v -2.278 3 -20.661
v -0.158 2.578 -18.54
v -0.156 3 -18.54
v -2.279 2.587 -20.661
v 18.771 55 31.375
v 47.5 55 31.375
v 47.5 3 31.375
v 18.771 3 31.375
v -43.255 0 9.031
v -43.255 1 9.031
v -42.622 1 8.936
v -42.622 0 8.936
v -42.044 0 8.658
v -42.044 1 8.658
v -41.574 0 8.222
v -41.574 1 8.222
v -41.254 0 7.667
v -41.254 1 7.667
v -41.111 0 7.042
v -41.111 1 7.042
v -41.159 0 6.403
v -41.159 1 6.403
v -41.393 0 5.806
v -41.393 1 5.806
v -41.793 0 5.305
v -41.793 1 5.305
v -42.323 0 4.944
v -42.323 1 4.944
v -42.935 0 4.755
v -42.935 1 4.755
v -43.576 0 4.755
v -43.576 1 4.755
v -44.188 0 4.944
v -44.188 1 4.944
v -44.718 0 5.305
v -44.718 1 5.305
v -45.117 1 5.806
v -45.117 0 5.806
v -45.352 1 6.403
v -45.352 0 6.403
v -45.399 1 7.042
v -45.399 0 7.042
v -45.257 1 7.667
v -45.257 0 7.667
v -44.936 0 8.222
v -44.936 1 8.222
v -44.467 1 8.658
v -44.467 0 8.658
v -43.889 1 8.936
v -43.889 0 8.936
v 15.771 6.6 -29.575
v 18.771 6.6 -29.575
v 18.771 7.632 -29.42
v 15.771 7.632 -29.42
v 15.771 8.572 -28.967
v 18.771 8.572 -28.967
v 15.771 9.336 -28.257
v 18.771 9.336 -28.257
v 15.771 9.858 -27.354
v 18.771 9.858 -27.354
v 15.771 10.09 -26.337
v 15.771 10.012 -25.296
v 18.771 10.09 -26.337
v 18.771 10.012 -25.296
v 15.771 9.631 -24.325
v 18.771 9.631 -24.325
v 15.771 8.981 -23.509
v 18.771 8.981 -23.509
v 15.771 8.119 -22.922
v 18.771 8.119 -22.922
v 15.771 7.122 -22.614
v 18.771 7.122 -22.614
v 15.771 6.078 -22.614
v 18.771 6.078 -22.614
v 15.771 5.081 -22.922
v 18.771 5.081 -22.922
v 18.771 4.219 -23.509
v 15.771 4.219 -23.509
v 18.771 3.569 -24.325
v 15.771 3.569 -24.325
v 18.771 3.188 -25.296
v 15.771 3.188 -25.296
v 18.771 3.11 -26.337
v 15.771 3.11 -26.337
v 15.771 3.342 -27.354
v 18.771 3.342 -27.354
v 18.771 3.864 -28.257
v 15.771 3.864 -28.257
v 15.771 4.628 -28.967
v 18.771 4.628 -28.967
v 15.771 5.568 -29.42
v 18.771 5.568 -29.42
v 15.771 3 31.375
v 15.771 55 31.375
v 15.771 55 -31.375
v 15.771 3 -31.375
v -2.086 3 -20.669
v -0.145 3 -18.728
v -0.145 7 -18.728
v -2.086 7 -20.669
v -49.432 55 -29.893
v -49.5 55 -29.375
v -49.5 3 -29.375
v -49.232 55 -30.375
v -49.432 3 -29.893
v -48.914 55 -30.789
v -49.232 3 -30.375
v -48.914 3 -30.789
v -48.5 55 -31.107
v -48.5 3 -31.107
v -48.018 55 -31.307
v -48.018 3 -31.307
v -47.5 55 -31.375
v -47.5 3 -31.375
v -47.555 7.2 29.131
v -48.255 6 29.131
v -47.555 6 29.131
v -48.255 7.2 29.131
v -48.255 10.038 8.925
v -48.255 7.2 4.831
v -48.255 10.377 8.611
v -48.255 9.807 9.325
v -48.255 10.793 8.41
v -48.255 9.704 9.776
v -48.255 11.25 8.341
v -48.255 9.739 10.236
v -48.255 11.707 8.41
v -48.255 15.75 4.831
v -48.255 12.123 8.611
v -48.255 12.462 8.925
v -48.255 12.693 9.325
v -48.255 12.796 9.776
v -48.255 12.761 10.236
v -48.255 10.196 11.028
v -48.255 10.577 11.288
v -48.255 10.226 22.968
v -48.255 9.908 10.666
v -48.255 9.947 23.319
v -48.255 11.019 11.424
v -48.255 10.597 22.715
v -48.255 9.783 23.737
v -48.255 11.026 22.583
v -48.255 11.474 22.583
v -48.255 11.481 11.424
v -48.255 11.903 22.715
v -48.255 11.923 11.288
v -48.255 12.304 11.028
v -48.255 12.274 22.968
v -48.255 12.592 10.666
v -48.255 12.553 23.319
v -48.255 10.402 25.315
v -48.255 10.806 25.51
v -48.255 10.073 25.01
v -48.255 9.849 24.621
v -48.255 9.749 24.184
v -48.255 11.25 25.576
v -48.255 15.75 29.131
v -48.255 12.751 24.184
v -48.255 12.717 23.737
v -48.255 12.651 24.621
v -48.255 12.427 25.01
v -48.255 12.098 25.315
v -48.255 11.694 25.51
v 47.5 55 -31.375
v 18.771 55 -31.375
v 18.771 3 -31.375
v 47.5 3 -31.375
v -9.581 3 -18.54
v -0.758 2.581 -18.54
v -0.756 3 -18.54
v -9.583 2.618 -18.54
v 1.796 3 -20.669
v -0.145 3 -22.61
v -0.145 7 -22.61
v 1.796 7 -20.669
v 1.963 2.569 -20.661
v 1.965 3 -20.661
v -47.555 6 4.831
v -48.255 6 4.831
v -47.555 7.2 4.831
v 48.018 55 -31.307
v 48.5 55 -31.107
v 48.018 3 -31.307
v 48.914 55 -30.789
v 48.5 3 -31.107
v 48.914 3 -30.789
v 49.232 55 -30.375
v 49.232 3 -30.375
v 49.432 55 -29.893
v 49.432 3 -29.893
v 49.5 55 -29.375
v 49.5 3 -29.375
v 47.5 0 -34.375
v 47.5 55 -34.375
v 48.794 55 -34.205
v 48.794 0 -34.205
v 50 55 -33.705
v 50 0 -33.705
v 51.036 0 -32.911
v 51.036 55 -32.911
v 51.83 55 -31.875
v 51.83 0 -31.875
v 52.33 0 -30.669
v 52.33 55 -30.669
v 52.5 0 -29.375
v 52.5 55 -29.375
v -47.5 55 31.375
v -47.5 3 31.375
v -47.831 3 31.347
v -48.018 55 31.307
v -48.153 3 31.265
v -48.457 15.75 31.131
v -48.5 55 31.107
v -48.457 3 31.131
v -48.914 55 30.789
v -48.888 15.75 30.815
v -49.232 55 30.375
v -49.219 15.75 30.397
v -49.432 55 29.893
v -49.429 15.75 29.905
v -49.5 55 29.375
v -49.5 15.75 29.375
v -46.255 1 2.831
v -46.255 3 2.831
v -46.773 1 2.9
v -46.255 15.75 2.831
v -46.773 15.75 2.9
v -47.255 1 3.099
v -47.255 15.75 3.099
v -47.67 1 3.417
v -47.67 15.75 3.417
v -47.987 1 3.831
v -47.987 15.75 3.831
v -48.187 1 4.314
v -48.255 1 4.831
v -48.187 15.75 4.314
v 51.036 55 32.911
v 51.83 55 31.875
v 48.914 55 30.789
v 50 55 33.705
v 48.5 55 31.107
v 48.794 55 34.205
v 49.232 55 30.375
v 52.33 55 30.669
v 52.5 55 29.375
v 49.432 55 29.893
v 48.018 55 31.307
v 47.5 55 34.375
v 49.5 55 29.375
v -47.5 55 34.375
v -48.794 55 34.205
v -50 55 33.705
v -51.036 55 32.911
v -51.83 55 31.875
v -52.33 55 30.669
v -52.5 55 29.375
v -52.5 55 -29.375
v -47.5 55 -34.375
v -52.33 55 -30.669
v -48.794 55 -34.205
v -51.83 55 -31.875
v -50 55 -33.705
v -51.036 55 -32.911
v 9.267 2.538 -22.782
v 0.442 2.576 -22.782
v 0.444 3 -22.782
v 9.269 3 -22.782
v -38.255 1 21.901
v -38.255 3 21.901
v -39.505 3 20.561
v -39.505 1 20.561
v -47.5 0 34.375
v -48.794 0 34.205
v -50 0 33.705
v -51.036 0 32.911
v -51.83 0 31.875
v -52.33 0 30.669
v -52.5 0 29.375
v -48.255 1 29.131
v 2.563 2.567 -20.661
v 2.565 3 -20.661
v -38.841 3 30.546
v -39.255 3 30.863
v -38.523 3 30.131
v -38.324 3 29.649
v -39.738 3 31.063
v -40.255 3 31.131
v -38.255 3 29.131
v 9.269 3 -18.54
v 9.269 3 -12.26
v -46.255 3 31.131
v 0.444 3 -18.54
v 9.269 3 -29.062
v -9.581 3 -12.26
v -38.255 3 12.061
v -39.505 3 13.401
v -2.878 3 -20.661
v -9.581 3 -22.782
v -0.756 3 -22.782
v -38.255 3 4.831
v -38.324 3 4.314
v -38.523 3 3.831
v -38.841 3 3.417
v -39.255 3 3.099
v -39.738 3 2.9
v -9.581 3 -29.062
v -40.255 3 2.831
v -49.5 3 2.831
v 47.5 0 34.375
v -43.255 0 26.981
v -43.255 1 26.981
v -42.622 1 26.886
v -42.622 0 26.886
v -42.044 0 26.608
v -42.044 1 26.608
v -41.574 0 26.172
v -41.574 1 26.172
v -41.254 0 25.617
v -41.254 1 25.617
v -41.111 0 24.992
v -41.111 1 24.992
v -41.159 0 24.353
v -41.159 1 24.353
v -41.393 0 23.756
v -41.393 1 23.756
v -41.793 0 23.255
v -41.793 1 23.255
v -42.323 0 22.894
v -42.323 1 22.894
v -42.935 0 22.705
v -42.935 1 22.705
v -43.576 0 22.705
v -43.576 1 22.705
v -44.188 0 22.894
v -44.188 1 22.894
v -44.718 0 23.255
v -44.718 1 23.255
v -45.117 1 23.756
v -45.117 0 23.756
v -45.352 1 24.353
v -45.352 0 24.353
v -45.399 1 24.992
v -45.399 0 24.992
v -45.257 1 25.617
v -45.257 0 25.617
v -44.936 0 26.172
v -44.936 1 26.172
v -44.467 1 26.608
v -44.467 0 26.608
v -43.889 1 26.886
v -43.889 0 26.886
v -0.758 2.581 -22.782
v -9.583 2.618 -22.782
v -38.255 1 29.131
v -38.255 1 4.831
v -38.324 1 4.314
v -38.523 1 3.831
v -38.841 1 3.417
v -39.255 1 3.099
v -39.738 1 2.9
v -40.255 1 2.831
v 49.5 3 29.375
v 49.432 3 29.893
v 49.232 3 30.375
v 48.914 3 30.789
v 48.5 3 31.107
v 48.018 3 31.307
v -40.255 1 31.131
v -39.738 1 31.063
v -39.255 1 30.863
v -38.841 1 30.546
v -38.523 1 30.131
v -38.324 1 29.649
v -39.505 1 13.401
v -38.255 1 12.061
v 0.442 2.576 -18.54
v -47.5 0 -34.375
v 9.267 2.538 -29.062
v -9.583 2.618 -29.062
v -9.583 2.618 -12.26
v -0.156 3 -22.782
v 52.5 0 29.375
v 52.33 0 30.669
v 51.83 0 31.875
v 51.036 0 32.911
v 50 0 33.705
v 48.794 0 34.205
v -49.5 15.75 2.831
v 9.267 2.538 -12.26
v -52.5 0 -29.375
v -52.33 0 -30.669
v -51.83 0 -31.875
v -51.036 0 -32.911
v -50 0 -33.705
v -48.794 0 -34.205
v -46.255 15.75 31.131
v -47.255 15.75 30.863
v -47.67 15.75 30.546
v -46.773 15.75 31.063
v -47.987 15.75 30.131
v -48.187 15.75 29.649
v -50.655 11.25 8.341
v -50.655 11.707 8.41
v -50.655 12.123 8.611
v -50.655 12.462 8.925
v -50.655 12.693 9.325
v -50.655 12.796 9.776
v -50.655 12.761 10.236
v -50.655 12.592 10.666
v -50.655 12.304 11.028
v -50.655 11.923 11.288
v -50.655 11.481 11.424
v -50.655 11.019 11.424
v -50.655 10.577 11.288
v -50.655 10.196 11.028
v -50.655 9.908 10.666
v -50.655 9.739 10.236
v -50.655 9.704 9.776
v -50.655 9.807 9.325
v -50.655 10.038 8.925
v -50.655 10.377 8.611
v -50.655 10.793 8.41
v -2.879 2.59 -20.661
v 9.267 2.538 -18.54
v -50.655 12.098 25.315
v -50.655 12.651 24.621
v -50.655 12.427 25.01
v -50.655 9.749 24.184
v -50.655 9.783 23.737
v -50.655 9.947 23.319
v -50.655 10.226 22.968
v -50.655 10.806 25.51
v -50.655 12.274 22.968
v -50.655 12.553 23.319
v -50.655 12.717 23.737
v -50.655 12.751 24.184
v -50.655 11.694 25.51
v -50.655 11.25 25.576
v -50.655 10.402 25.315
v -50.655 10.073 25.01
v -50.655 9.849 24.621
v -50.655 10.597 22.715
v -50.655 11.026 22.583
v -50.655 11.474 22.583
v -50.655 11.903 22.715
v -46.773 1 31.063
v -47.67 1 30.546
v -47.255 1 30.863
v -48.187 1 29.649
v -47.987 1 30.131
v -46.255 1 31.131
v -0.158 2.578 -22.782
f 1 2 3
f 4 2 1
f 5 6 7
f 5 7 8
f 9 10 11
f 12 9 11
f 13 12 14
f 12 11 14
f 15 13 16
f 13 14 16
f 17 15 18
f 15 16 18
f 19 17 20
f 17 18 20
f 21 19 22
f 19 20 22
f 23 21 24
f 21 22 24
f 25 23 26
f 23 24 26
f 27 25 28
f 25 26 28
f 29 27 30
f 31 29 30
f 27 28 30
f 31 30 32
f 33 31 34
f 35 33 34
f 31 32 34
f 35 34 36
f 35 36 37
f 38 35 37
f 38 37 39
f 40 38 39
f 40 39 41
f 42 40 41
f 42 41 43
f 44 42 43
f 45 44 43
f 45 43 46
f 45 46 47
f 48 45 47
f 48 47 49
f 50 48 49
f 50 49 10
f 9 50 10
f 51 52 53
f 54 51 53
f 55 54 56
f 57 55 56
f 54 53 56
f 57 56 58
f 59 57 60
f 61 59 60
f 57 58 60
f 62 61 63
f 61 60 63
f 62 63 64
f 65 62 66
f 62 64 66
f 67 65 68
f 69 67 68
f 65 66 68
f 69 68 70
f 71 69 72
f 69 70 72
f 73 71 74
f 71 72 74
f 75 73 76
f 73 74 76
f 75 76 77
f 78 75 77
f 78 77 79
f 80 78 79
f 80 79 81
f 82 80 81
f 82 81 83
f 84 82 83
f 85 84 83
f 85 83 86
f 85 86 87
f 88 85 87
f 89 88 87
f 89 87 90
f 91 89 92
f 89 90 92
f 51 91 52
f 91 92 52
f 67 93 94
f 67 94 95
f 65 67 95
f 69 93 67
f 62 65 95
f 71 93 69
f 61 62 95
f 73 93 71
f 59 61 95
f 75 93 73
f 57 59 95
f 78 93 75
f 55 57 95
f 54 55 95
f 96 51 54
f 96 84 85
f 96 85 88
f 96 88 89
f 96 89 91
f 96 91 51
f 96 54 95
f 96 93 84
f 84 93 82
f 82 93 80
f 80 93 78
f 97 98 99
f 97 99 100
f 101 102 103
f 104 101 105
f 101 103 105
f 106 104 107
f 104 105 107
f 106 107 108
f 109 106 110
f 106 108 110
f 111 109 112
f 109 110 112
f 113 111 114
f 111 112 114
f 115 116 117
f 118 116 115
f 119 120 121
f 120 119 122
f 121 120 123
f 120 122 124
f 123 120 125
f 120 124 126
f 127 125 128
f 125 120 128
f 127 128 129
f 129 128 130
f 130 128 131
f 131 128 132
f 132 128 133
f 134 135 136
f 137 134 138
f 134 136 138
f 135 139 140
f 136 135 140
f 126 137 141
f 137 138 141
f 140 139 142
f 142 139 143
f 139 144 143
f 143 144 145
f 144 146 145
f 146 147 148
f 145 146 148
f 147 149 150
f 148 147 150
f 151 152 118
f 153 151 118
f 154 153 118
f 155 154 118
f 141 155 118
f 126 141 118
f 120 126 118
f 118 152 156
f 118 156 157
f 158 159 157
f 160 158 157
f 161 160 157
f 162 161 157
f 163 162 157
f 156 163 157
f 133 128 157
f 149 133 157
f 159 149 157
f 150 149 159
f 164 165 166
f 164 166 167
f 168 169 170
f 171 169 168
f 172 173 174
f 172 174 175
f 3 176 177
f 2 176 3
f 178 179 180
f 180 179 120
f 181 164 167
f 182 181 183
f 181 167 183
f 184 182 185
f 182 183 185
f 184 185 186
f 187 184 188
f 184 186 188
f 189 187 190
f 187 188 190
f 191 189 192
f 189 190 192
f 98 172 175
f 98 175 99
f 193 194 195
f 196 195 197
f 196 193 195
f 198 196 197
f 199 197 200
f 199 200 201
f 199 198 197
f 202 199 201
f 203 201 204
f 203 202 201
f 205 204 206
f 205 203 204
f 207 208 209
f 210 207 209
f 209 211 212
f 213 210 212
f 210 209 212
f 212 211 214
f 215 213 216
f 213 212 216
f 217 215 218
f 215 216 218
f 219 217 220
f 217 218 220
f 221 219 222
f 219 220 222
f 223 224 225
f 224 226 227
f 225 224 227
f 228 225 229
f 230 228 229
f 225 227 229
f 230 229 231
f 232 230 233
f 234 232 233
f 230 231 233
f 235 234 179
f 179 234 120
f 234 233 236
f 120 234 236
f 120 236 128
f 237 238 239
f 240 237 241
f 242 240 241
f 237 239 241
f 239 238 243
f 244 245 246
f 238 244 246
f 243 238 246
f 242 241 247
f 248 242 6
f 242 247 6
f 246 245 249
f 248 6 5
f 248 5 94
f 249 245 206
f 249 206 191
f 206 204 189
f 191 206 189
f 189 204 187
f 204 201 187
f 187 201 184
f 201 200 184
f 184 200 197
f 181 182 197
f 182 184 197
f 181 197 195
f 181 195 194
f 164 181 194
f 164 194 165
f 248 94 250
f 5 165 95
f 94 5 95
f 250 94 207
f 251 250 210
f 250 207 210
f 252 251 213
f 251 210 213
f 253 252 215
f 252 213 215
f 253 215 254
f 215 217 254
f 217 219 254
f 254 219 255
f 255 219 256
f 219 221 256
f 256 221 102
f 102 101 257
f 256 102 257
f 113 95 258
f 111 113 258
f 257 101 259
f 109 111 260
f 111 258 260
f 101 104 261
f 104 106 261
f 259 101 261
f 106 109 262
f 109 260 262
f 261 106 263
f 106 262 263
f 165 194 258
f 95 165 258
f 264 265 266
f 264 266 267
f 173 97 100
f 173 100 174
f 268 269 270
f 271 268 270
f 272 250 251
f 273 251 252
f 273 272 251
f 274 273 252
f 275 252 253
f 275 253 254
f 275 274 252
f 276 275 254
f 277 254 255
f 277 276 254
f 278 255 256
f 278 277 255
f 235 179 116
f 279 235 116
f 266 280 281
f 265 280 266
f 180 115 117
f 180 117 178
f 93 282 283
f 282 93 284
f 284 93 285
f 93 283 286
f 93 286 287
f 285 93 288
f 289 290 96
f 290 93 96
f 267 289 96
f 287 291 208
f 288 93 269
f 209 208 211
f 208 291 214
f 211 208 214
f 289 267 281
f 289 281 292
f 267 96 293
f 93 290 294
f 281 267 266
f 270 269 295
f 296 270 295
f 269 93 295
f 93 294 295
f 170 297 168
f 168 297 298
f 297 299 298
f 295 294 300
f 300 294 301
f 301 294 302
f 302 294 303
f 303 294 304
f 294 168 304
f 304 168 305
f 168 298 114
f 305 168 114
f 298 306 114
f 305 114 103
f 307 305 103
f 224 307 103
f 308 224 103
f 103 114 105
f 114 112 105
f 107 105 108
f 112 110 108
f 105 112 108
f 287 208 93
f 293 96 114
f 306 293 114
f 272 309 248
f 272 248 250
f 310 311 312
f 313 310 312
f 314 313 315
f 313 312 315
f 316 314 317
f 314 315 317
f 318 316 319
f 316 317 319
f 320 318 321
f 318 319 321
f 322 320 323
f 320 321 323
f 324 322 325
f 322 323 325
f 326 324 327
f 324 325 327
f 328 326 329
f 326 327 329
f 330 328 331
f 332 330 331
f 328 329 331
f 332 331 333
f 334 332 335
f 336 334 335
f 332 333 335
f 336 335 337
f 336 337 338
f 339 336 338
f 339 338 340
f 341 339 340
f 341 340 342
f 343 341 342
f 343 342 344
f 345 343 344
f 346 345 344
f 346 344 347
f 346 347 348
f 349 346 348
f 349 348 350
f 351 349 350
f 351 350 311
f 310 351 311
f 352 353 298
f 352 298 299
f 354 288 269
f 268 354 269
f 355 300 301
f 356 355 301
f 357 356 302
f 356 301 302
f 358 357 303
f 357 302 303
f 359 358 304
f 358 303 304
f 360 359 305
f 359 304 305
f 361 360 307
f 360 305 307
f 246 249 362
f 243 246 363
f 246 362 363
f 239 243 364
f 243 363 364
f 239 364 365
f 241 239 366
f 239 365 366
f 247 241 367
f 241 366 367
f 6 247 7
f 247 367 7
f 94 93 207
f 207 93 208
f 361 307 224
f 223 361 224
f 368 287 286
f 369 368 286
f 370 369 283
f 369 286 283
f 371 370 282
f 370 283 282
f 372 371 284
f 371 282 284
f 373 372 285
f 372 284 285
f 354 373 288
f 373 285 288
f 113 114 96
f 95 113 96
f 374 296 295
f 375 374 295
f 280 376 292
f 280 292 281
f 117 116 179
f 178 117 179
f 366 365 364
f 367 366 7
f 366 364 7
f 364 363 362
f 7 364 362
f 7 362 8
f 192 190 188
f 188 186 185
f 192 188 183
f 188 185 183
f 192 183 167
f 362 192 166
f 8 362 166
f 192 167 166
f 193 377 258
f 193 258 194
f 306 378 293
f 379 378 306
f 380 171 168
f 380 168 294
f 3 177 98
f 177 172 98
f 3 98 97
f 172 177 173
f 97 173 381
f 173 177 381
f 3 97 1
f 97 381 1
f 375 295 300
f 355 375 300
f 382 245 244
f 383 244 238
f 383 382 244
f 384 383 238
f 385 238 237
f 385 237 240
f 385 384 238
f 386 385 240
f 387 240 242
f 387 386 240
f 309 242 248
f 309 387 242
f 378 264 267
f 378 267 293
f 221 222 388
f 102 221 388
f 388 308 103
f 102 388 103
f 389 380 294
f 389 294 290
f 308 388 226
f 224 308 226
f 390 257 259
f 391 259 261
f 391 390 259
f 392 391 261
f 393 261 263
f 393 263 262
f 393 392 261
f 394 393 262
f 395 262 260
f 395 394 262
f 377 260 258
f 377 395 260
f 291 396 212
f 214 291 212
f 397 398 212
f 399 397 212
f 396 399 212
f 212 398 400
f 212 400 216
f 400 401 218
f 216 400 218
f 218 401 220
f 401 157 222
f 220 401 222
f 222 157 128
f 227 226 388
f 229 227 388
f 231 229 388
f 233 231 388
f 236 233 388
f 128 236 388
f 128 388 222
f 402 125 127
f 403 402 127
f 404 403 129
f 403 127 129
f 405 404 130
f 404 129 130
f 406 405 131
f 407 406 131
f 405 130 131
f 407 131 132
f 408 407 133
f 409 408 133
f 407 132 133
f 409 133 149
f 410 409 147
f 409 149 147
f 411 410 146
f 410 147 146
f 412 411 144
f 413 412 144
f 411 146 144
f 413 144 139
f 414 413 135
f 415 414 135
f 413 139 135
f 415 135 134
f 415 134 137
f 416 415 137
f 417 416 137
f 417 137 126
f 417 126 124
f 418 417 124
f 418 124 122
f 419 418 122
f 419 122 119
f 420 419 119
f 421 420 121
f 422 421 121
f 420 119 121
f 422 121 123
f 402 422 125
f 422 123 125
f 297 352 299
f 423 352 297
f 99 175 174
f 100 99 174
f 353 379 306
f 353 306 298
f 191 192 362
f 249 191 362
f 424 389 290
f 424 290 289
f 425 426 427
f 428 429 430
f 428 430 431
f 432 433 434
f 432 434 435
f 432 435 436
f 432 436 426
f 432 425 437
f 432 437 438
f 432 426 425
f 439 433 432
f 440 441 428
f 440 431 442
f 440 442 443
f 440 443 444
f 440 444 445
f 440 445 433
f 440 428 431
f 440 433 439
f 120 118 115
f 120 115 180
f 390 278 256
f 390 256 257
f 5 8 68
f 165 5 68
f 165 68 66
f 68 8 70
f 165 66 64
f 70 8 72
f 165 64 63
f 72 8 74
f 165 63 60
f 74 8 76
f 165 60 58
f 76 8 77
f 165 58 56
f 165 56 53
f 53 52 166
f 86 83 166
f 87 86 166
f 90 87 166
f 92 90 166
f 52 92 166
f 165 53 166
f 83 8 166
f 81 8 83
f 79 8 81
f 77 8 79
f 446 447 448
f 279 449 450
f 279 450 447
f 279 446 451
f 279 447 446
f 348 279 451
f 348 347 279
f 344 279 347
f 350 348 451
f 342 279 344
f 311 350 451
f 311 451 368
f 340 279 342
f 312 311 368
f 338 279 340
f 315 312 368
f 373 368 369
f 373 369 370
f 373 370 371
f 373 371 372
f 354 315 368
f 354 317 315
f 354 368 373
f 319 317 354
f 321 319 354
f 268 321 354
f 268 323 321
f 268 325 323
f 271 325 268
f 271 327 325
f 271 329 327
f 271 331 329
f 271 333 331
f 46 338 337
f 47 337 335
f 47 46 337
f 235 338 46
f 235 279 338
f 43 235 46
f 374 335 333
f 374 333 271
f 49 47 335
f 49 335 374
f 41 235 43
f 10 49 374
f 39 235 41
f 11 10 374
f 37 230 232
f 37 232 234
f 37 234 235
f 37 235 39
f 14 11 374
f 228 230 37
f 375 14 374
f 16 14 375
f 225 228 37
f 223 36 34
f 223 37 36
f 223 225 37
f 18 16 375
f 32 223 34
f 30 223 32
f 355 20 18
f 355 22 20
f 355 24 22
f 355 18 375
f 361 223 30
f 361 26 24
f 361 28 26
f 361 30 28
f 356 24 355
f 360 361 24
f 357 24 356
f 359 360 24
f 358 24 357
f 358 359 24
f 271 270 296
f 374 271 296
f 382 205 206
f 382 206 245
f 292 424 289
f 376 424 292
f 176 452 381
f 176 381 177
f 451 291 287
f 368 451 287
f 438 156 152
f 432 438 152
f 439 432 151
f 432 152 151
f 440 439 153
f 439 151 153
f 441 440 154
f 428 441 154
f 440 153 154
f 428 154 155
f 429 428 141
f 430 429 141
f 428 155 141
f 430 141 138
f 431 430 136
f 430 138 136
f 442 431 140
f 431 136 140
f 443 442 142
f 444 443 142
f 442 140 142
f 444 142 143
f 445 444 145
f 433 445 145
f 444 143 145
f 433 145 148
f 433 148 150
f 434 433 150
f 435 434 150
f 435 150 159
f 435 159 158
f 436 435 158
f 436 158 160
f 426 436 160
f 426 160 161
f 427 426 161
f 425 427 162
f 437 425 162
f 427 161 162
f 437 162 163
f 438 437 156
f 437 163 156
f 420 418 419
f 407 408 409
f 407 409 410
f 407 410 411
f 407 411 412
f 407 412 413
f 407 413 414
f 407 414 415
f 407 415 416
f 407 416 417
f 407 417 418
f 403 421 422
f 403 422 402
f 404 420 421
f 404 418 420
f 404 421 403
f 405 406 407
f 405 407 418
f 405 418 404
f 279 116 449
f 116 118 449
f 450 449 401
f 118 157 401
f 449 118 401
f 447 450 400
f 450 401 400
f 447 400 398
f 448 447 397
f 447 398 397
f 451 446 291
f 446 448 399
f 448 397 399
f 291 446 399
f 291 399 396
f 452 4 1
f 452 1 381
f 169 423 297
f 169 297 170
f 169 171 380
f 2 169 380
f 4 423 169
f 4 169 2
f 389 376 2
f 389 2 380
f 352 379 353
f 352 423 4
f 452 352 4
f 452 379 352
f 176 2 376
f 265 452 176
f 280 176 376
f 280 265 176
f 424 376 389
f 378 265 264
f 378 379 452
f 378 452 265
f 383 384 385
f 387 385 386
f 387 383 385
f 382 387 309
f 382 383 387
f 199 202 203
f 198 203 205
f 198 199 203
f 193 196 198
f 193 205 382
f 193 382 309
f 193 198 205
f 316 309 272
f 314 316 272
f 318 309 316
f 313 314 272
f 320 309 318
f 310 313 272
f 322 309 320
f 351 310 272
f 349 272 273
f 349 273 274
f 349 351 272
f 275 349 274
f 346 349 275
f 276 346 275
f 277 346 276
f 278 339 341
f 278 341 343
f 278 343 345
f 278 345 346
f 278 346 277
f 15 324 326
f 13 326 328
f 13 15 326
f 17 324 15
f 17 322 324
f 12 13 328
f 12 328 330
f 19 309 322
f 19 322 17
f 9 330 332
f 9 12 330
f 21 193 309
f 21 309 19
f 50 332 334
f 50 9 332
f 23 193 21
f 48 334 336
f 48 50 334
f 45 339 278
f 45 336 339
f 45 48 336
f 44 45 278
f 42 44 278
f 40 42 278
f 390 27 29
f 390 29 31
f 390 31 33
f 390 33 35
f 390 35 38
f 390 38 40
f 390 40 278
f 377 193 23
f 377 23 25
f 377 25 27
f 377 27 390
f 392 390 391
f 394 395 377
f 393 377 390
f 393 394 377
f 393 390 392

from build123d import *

# Parameters (mm, degrees)
BOSS_EXTRUDE1_DEPTH                     = 55
SHELL1_T                                = -3
CUT_EXTRUDE1_DEPTH                      = 2
BATTERY_CONNECTOR_SKETCH_3_R            = 2.15
CUT_EXTRUDE2_DEPTH                      = 3
BATTERY_CONNECTOR_SKETCH_4_R            = 2.15
CUT_EXTRUDE3_DEPTH                      = 3
BOSS_EXTRUDE6_START                     = 12.75
BOSS_EXTRUDE6_DEPTH                     = 12.75
CONNECTOR_SIDE_MOUNT_SKETCH_R           = 1.55
CONNECTOR_SIDE_MOUNT_SKETCH_R_2         = 1.505
CONNECTOR_MOUNT_PINS_SOCKETS_DEPTH      = 2.4
CONNECTOR_MOUNT_PINS_SOCKETS_SKETCH_3_W = 24.3
CONNECTOR_MOUNT_PINS_SOCKETS_SKETCH_3_H = 1.2
BOSS_EXTRUDE7_DEPTH                     = 0.7
PARTITION_SKETCH_W                      = 3
PARTITION_SKETCH_H                      = 62.75
PARTITION_BOSS_DEPTH                    = 52
SKETCH28_R                              = 3.5
PARTITION_CABLE_PASS_HOLE_DEPTH         = 3
CAVITY2_START                           = 2.577739742
CAVITY2_DEPTH                           = 0.461520646
BOSS_EXTRUDE8_DEPTH                     = 4


# Read off the part's stored shape, not the designer's step: Cavity2
with BuildPart() as part:
    # Sketch2 → Boss-Extrude1 (new body)
    with BuildSketch(Plane(origin=(0, 0, 0), x_dir=(1, 0, 0), z_dir=(0, 1, 0))):
        with BuildLine():
            Line((47.5, -34.375), (-47.5, -34.375))
            ThreePointArc((-47.5, -34.375), (-51.035533906, -32.910533906), (-52.5, -29.375))
            Line((-52.5, -29.375), (-52.5, 29.375))
            ThreePointArc((-52.5, 29.375), (-51.035533906, 32.910533906), (-47.5, 34.375))
            Line((-47.5, 34.375), (47.5, 34.375))
            ThreePointArc((47.5, 34.375), (51.035533906, 32.910533906), (52.5, 29.375))
            Line((52.5, 29.375), (52.5, -29.375))
            ThreePointArc((52.5, -29.375), (51.035533906, -32.910533906), (47.5, -34.375))
        make_face()
    extrude(amount=BOSS_EXTRUDE1_DEPTH)

    # Shell1
    shell1_openings = [part.faces().sort_by_distance(p)[0] for p in [
        (0, 55, 0),
    ]]
    offset(amount=SHELL1_T, openings=shell1_openings, kind=Kind.INTERSECTION)

    # battery_connector_sketch → Cut-Extrude1 (cut)
    with BuildSketch(Plane(origin=(0, 3, 0), x_dir=(1, 0, 0), z_dir=(0, 1, 0))):
        with BuildLine():
            Line((-48.255414742, -4.831437415), (-48.255414742, -29.131437415))
            ThreePointArc((-48.255414742, -29.131437415), (-47.669628305, -30.545650977), (-46.255414742, -31.131437415))
            Line((-46.255414742, -31.131437415), (-40.255414742, -31.131437415))
            ThreePointArc((-40.255414742, -31.131437415), (-38.84120118, -30.545650977), (-38.255414742, -29.131437415))
            Line((-38.255414742, -29.131437415), (-38.255414742, -21.901437415))
            Line((-38.255414742, -21.901437415), (-39.505414742, -20.561437415))
            Line((-39.505414742, -20.561437415), (-39.505414742, -13.401437415))
            Line((-39.505414742, -13.401437415), (-38.255414742, -12.061437415))
            Line((-38.255414742, -12.061437415), (-38.255414742, -4.831437415))
            ThreePointArc((-38.255414742, -4.831437415), (-38.84120118, -3.417223852), (-40.255414742, -2.831437415))
            Line((-40.255414742, -2.831437415), (-46.255414742, -2.831437415))
            ThreePointArc((-46.255414742, -2.831437415), (-47.669628305, -3.417223852), (-48.255414742, -4.831437415))
        make_face()
    extrude(amount=-CUT_EXTRUDE1_DEPTH, mode=Mode.SUBTRACT)

    # battery_connector_sketch<3> → Cut-Extrude2 (cut)
    with BuildSketch(Plane(origin=(0, 3, 0), x_dir=(1, 0, 0), z_dir=(0, 1, 0))):
        with Locations(Location((-43.255414742, -6.881437415, 0), (0, 0, 270))):
            Circle(BATTERY_CONNECTOR_SKETCH_3_R)
    extrude(amount=-CUT_EXTRUDE2_DEPTH, mode=Mode.SUBTRACT)

    # battery_connector_sketch<4> → Cut-Extrude3 (cut)
    with BuildSketch(Plane(origin=(0, 3, 0), x_dir=(1, 0, 0), z_dir=(0, 1, 0))):
        with Locations(Location((-43.255414742, -24.831437415, 0), (0, 0, 270))):
            Circle(BATTERY_CONNECTOR_SKETCH_4_R)
    extrude(amount=-CUT_EXTRUDE3_DEPTH, mode=Mode.SUBTRACT)

    # Sketch25 → Boss-Extrude6 (add)
    with BuildSketch(Plane(origin=(0, 3, 0), x_dir=(1, 0, 0), z_dir=(0, 1, 0)).offset(BOSS_EXTRUDE6_START)):
        with BuildLine():
            Line((-46.255414742, -31.131437415), (-48.456518483, -31.131437415))
            ThreePointArc((-48.456518483, -31.131437415), (-49.21945296, -30.396509431), (-49.5, -29.375))
            Line((-49.5, -29.375), (-49.5, -2.831437415))
            Line((-49.5, -2.831437415), (-46.255414742, -2.831437415))
            ThreePointArc((-46.255414742, -2.831437415), (-47.669628305, -3.417223852), (-48.255414742, -4.831437415))
            Line((-48.255414742, -4.831437415), (-48.255414742, -29.131437415))
            ThreePointArc((-48.255414742, -29.131437415), (-47.669628305, -30.545650977), (-46.255414742, -31.131437415))
        make_face()
    extrude(amount=-BOSS_EXTRUDE6_DEPTH)

    # connector_side_mount_sketch → connector_mount_pins_sockets (cut)
    with BuildSketch(Plane(origin=(-48.255414742, 0, 0), x_dir=(0, 0, -1), z_dir=(1, 0, 0))):
        with Locations((-9.891437415, 11.25)):
            Circle(CONNECTOR_SIDE_MOUNT_SKETCH_R)
        with Locations(Location((-24.071437415, 11.25, 0), (0, 0, 180))):
            Circle(CONNECTOR_SIDE_MOUNT_SKETCH_R_2)
    extrude(amount=-CONNECTOR_MOUNT_PINS_SOCKETS_DEPTH, mode=Mode.SUBTRACT)

    # connector_mount_pins_sockets_sketch<3> → Boss-Extrude7 (add)
    with BuildSketch(Plane(origin=(-48.255414742, 0, 0), x_dir=(0, 0, -1), z_dir=(1, 0, 0))):
        with Locations((-16.981437415, 6.6)):
            Rectangle(CONNECTOR_MOUNT_PINS_SOCKETS_SKETCH_3_W, CONNECTOR_MOUNT_PINS_SOCKETS_SKETCH_3_H)
    extrude(amount=BOSS_EXTRUDE7_DEPTH)

    # partition-sketch → partition-boss (add)
    with BuildSketch(Plane(origin=(0, 3, 0), x_dir=(1, 0, 0), z_dir=(0, 1, 0))):
        with Locations((17.270599113, 0)):
            Rectangle(PARTITION_SKETCH_W, PARTITION_SKETCH_H)
    extrude(amount=PARTITION_BOSS_DEPTH)

    # Sketch28 → partition-cable-pass-hole (cut)
    with BuildSketch(Plane(origin=(18.770599113, 0, 0), x_dir=(0, 0, -1), z_dir=(1, 0, 0))):
        with Locations((26.075, 6.6)):
            Circle(SKETCH28_R)
    extrude(amount=-PARTITION_CABLE_PASS_HOLE_DEPTH, mode=Mode.SUBTRACT)

    # Cavity2 outline → Cavity2 (cut)
    with BuildSketch(Plane(origin=(0, 0, 0), x_dir=(0.9999910167650304, -0.004238677770298889, 0), z_dir=(0.004238677770298889, 0.9999910167650305, 0)).offset(CAVITY2_START)):
        Polygon((0.430972634, 22.782282347), (9.255972634, 22.782282347), (9.255972634, 29.062282347), (-9.594027366, 29.062282347), (-9.594027366, 22.782282347), (-0.769027366, 22.782282347), (-2.890347709, 20.660962004), (-0.769027366, 18.53964166), (-9.594027366, 18.53964166), (-9.594027366, 12.25964166), (9.255972634, 12.25964166), (9.255972634, 18.53964166), (0.430972634, 18.53964166), (2.552292978, 20.660962004), align=None)
        Polygon((-0.169027366, 18.53964166), (-2.290347709, 20.660962004), (-0.169027366, 22.782282347), (1.952292978, 20.660962004), align=None, mode=Mode.SUBTRACT)
    extrude(amount=CAVITY2_DEPTH, mode=Mode.SUBTRACT)

    # Sketch32 → Boss-Extrude8 (add)
    with BuildSketch(Plane(origin=(0, 3, 0), x_dir=(1, 0, 0), z_dir=(0, 1, 0))):
        Polygon((-0.144808067, 22.60955262), (1.795970783, 20.66877377), (-0.144808067, 18.727994921), (-2.085586916, 20.66877377), align=None)
    extrude(amount=BOSS_EXTRUDE8_DEPTH)


solid = part.part
